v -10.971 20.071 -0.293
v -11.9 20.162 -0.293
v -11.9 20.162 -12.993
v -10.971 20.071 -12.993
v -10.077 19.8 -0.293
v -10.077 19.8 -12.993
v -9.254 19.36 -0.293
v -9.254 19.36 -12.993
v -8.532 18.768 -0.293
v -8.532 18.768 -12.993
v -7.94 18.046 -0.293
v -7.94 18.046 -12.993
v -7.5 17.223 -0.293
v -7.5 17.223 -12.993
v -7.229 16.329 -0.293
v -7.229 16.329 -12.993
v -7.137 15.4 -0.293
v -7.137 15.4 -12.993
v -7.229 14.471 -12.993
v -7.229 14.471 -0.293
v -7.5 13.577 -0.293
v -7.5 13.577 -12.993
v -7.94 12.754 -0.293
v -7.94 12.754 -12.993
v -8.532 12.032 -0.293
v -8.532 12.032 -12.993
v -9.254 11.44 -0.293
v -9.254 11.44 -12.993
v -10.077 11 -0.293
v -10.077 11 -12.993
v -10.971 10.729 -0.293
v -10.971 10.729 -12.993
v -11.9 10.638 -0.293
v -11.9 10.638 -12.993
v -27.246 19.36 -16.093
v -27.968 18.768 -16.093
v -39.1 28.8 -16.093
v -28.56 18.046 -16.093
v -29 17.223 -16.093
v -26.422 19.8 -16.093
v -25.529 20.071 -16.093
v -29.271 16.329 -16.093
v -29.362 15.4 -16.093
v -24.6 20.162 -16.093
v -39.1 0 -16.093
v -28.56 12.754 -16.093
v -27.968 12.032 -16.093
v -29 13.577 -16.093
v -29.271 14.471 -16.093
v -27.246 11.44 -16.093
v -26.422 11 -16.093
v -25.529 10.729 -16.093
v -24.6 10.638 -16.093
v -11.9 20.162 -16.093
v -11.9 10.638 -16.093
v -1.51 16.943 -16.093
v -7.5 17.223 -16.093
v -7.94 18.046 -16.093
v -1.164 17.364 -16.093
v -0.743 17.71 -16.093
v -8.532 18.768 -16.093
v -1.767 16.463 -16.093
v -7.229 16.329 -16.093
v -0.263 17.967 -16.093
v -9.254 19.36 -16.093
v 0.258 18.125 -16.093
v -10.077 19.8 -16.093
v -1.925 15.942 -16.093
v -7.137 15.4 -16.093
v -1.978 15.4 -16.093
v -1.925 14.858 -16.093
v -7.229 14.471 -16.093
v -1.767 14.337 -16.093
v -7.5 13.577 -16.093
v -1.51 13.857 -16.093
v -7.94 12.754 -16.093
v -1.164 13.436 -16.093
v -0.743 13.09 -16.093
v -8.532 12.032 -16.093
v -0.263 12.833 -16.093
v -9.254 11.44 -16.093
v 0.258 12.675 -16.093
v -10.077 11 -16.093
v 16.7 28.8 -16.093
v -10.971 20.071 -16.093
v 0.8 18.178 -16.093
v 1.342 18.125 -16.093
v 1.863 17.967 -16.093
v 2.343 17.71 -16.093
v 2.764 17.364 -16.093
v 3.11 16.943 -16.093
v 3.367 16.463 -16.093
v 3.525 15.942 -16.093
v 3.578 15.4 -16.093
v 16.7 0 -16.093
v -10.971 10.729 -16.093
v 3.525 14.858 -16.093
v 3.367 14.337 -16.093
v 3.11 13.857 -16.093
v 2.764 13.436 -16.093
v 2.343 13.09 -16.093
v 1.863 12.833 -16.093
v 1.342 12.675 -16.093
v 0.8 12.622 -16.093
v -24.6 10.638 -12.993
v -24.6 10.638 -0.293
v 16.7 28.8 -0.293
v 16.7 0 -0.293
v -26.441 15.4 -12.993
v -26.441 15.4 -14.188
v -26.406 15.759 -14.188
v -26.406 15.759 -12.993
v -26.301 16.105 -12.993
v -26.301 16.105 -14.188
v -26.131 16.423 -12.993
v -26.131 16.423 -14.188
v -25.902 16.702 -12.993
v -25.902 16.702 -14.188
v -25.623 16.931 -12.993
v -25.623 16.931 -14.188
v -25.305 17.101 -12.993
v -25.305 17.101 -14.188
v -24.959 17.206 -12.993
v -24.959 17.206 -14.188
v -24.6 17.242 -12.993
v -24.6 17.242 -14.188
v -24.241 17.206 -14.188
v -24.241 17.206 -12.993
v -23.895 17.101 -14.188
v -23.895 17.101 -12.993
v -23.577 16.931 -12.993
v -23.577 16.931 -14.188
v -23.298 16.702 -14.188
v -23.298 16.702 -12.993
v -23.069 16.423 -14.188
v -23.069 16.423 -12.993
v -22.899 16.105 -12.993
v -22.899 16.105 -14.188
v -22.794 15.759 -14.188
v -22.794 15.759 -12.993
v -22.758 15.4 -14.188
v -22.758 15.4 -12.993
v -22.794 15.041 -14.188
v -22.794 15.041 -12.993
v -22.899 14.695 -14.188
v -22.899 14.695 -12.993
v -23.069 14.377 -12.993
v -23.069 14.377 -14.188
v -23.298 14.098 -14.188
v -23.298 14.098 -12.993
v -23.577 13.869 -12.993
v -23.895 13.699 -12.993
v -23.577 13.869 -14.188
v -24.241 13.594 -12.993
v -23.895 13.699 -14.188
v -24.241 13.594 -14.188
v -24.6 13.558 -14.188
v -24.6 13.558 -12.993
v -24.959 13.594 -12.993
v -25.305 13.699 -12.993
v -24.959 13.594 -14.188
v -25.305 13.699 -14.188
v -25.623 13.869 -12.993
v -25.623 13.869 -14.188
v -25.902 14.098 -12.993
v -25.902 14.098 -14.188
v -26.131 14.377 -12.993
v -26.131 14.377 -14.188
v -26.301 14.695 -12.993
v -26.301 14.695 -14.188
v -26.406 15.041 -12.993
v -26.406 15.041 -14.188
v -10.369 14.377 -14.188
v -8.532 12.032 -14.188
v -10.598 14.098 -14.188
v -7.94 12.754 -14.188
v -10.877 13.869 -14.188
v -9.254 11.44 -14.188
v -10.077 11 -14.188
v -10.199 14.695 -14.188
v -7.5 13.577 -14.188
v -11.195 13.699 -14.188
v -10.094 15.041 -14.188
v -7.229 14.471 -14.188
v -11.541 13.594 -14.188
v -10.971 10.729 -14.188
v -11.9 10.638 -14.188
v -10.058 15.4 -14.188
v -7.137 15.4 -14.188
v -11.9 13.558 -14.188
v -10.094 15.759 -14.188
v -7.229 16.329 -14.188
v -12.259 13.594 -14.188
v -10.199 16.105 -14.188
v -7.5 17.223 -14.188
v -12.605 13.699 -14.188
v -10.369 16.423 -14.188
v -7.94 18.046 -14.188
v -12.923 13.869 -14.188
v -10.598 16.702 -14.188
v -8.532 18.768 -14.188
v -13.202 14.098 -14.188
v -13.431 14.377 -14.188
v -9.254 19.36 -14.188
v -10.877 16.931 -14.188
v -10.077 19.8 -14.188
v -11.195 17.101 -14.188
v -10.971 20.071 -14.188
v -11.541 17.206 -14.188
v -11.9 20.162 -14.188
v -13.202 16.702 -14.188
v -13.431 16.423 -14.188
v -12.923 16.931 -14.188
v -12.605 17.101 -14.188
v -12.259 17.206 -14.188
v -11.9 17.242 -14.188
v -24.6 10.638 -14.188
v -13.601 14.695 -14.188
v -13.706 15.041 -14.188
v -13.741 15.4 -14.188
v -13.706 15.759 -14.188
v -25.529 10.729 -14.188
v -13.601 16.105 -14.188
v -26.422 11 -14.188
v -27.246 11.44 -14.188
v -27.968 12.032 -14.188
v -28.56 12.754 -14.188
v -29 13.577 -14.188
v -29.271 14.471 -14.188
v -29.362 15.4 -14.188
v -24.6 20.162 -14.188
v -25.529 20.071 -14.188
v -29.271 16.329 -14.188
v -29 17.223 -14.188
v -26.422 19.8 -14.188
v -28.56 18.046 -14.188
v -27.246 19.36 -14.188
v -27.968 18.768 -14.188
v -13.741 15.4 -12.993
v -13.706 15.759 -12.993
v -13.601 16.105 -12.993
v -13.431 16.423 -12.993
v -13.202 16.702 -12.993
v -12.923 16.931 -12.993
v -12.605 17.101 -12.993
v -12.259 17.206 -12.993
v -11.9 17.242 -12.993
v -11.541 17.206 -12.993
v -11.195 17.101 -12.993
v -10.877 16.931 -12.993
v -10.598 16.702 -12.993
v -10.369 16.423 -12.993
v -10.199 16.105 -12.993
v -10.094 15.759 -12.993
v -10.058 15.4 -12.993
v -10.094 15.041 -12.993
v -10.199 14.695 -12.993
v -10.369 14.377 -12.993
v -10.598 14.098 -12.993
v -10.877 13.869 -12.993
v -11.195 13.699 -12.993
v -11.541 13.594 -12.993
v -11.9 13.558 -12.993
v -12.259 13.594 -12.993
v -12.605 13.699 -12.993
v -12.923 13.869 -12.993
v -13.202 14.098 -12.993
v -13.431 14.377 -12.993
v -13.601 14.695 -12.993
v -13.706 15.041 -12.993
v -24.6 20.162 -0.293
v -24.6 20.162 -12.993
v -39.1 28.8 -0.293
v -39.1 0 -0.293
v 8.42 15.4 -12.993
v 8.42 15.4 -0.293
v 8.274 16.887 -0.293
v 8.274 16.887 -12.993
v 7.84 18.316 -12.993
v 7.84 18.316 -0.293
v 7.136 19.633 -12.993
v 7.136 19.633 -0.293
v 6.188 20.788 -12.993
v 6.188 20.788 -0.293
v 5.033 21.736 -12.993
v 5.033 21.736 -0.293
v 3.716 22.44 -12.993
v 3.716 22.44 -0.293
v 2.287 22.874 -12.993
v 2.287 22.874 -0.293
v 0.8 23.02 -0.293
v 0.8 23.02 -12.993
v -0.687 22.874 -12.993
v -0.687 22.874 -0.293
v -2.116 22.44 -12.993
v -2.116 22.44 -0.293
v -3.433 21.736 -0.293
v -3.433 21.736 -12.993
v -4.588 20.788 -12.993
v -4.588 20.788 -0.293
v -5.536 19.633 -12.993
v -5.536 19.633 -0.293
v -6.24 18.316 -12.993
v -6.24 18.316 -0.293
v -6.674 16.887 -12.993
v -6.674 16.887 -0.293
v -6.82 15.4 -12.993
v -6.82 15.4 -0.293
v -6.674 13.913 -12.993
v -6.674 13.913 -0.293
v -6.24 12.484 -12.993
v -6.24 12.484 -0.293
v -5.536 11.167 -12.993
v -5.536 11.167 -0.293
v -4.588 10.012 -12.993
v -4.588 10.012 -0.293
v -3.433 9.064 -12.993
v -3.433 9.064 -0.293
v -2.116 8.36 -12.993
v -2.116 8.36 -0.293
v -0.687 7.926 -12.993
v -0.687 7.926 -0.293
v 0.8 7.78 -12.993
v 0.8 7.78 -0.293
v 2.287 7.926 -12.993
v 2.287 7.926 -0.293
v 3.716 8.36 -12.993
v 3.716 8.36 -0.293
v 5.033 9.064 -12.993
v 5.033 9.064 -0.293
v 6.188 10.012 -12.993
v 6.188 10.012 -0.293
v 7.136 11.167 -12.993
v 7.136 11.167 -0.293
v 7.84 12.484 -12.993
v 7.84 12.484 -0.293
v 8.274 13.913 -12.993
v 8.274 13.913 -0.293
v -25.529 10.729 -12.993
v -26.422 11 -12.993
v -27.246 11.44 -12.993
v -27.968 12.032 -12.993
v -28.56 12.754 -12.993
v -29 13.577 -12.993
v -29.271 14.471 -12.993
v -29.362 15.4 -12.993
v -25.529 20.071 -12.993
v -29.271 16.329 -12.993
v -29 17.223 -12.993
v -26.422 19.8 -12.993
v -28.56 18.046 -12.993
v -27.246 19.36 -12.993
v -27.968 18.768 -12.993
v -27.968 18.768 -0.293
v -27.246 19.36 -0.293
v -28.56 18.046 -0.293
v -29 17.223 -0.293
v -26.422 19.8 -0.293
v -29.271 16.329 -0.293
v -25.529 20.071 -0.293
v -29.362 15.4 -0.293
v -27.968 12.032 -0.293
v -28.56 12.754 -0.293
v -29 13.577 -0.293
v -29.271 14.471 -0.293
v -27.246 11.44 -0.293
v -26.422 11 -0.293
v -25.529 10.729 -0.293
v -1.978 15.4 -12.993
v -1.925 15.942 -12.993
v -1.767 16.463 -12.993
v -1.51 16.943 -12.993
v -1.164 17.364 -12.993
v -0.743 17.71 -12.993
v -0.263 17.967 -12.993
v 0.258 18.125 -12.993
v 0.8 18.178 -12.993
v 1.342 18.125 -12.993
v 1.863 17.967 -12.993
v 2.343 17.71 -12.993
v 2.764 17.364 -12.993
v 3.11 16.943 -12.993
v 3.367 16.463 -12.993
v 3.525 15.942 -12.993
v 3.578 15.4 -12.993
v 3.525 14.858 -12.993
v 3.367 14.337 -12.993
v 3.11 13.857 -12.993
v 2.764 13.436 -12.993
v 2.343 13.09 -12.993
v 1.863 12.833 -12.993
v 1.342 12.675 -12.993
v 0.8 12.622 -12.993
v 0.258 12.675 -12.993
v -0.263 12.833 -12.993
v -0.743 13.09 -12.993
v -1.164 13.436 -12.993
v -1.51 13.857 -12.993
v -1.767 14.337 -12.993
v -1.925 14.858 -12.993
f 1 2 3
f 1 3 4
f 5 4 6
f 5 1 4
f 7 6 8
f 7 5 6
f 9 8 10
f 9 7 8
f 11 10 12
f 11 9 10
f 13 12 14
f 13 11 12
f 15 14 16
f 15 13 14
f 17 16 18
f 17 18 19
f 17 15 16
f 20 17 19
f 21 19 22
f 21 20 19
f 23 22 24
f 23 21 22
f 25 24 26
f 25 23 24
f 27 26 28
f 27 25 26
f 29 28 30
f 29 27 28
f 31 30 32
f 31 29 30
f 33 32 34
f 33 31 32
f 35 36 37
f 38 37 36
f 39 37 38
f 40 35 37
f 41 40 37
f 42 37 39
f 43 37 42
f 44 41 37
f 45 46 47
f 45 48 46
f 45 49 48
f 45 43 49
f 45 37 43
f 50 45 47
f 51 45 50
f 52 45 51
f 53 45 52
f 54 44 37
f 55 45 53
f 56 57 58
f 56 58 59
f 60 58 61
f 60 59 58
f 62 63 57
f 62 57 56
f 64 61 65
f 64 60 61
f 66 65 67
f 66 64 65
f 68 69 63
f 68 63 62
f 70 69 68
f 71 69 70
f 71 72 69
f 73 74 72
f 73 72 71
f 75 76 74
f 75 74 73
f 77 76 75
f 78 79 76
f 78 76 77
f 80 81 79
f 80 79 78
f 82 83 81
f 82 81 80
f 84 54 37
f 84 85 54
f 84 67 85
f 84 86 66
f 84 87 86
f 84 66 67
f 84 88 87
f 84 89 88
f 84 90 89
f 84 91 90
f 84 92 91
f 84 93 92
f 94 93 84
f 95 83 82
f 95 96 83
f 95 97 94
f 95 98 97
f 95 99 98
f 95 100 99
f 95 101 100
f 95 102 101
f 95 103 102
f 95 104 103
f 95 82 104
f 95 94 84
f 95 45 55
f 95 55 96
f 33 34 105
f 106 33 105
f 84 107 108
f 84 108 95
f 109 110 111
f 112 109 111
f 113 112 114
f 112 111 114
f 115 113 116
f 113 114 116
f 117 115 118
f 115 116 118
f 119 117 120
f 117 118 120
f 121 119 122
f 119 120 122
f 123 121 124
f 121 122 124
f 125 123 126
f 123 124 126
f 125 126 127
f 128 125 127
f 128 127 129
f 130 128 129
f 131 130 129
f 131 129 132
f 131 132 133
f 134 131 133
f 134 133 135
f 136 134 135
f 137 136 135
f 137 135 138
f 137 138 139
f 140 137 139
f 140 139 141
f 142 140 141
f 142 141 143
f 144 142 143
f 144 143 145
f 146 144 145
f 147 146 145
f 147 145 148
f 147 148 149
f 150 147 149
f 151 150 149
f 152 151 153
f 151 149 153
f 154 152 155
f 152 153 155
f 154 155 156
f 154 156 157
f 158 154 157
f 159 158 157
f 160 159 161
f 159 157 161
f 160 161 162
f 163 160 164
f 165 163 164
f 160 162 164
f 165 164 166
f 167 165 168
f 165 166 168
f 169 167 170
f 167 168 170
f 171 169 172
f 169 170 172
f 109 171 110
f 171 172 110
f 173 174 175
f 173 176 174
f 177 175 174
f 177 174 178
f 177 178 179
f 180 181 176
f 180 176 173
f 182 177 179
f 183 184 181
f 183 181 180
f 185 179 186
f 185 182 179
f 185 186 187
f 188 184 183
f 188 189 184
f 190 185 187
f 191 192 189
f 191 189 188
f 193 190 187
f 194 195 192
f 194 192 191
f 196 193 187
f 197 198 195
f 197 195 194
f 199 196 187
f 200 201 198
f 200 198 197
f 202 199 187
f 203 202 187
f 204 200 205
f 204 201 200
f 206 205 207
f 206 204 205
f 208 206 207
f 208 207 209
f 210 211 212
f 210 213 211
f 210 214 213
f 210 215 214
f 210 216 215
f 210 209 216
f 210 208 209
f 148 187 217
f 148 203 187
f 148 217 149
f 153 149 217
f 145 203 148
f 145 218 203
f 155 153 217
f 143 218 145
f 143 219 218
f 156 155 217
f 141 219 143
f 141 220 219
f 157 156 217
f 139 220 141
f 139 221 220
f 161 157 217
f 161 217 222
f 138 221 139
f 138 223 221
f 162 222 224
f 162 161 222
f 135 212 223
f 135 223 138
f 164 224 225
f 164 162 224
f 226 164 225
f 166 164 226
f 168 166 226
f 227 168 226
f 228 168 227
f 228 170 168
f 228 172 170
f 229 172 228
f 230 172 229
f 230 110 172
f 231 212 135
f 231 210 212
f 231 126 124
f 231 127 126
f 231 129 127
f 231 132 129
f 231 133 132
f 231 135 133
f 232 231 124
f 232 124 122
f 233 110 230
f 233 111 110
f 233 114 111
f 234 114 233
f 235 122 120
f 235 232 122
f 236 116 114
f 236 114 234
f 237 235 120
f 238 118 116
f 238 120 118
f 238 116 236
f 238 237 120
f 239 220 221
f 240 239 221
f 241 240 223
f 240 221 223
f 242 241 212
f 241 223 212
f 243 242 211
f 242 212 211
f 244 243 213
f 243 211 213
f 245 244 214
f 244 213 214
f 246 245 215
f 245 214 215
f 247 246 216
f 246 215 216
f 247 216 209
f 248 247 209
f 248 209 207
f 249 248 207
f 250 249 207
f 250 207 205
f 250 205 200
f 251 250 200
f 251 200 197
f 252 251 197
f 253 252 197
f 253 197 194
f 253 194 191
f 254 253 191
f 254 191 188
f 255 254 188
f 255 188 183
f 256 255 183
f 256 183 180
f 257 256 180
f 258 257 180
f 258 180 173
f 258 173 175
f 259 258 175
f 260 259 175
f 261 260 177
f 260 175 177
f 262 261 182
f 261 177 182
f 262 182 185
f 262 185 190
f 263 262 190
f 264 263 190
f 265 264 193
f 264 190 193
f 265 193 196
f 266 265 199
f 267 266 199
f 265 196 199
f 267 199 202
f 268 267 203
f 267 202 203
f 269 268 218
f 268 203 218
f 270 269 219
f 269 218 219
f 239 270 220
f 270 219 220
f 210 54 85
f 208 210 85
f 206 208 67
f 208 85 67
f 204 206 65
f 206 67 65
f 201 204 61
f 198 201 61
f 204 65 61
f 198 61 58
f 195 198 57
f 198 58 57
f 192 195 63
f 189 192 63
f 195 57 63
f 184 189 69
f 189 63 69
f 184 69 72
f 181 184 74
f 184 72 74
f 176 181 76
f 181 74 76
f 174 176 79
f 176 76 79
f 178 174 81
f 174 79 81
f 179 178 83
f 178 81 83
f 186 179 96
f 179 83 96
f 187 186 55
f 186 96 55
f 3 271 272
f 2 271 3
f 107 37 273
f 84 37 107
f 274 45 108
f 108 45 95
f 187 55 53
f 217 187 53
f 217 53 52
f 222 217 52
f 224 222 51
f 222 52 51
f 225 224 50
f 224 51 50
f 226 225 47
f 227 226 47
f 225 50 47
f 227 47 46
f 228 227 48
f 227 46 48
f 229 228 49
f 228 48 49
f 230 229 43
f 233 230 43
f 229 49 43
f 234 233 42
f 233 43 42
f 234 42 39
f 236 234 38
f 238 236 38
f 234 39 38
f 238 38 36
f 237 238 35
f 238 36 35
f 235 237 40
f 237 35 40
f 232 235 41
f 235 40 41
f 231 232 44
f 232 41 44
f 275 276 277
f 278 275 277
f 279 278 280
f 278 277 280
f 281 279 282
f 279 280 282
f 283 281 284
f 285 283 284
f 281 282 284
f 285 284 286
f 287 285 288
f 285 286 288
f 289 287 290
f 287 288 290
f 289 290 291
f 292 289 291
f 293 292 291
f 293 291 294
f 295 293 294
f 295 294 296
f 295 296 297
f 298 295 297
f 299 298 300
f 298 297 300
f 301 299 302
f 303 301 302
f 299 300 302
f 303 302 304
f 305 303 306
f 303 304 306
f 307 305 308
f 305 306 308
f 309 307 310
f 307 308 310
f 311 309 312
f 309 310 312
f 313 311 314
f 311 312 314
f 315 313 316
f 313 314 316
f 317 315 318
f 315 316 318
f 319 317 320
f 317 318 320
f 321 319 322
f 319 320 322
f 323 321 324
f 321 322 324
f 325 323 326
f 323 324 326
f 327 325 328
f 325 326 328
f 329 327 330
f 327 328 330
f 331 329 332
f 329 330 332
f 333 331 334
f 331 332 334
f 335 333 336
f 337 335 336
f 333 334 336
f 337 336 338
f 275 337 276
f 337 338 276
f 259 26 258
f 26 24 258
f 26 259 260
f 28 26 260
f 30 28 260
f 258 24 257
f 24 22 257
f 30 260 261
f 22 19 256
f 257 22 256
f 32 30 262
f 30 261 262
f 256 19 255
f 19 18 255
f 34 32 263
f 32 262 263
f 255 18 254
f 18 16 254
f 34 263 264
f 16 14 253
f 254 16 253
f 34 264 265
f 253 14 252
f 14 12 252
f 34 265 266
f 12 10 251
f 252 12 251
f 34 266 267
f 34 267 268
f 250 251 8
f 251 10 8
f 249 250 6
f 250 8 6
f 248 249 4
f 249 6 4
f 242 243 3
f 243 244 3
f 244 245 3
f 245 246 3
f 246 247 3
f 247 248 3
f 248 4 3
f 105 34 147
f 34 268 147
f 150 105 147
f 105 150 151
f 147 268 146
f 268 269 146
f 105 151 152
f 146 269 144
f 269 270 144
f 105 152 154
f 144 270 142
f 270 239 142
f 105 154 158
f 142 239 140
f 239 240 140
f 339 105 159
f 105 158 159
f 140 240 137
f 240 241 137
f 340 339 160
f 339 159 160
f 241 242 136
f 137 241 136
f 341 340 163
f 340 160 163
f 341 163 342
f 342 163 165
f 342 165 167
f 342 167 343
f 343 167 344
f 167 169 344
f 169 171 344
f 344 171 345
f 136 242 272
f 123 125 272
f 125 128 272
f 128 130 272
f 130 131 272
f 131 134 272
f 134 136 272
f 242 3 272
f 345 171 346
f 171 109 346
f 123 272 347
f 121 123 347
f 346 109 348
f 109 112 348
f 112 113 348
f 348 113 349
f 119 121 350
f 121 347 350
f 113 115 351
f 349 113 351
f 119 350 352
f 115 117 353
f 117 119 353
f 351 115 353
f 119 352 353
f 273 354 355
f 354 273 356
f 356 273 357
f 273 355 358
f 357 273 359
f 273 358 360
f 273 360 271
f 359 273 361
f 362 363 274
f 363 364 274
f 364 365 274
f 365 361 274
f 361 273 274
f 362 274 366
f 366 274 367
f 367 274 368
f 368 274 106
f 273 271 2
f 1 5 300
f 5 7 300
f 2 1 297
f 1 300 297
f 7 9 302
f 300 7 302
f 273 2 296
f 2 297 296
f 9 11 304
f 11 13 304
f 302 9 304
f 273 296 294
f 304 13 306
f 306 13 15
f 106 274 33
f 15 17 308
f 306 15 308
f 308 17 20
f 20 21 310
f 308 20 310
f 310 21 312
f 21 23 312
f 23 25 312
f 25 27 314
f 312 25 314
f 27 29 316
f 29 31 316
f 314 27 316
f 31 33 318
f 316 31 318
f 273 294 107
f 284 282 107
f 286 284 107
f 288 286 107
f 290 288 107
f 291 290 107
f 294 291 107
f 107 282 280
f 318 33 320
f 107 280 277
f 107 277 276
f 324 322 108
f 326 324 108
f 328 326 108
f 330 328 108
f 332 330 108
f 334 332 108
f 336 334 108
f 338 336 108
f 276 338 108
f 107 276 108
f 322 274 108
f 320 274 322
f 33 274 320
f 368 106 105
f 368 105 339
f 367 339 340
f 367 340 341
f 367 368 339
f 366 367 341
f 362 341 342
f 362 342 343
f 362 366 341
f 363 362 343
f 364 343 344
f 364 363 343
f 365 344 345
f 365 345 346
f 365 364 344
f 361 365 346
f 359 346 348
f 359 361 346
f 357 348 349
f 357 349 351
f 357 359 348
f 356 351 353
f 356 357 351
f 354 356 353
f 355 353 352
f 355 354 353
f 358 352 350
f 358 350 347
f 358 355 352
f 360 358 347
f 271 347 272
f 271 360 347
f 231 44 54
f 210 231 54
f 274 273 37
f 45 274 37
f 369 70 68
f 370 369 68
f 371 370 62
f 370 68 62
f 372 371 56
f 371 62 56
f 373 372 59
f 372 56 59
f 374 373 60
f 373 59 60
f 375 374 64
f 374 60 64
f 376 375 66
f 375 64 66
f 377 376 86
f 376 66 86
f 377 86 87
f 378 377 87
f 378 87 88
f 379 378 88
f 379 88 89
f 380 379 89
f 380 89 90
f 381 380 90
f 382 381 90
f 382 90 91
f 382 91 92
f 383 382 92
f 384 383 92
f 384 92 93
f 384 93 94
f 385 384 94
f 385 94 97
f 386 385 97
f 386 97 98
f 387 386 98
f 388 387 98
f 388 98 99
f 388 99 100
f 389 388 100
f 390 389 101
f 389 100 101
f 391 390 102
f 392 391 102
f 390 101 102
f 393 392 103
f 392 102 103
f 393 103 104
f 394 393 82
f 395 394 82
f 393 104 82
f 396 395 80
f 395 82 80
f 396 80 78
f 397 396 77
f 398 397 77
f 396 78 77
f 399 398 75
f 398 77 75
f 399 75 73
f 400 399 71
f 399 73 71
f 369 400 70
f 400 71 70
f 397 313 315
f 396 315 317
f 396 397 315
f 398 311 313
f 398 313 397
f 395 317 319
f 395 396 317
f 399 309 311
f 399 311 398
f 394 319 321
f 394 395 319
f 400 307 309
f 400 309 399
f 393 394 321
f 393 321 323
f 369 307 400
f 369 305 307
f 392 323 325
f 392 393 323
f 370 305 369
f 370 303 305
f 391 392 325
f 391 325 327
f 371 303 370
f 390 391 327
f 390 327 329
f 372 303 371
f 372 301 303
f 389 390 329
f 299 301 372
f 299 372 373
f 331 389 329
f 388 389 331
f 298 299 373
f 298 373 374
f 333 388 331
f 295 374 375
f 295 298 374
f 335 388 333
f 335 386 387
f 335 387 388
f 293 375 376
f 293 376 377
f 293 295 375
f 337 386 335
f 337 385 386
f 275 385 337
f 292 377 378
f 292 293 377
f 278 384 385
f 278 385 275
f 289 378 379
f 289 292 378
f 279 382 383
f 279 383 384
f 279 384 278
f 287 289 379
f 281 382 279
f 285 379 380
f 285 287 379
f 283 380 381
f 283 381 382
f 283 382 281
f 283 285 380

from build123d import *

# Parameters (mm, degrees)
SKETCH1_W           = 55.8
SKETCH1_H           = 15.8
BOSS_EXTRUDE1_DEPTH = 28.8
SKETCH2_R           = 7.62
CUT_EXTRUDE1_DEPTH  = 12.7
SKETCH4_R           = 2.778125
SKETCH4_R_2         = 1.8415
CUT_EXTRUDE2_DEPTH  = 12.7
CUT_EXTRUDE6_DEPTH  = 1.905


with BuildPart() as part:
    # Sketch1 → Boss-Extrude1 (new body)
    with BuildSketch(Plane(origin=(0, 0, 0), x_dir=(1, 0, 0), z_dir=(0, 1, 0))):
        with Locations((-11.199948696, 8.193463303)):
            Rectangle(SKETCH1_W, SKETCH1_H)
    extrude(amount=BOSS_EXTRUDE1_DEPTH)

    # Sketch2 → Cut-Extrude1 (cut)
    with BuildSketch(Plane.XY.offset(-0.293463303)):
        with Locations((0.800051304, 15.4)):
            Circle(SKETCH2_R)
        with BuildLine():
            Line((-11.899948696, 10.6375), (-24.599948696, 10.6375))
            ThreePointArc((-24.599948696, 10.6375), (-29.362448696, 15.4), (-24.599948696, 20.1625))
            Line((-24.599948696, 20.1625), (-11.899948696, 20.1625))
            ThreePointArc((-11.899948696, 20.1625), (-7.137448696, 15.4), (-11.899948696, 10.6375))
        make_face()
    extrude(amount=-CUT_EXTRUDE1_DEPTH, mode=Mode.SUBTRACT)

    # Sketch4 → Cut-Extrude2 (cut)
    with BuildSketch(Plane(origin=(0, 0, -16.093463303), x_dir=(-1, 0, 0), z_dir=(0, 0, -1))):
        with Locations((-0.800051304, 15.4)):
            Circle(SKETCH4_R)
        with Locations((11.899948696, 15.4)):
            Circle(SKETCH4_R_2)
        with Locations((24.599948696, 15.4)):
            Circle(SKETCH4_R_2)
    extrude(amount=-CUT_EXTRUDE2_DEPTH, mode=Mode.SUBTRACT)

    # Sketch5 → Cut-Extrude6 (cut)
    with BuildSketch(Plane(origin=(0, 0, -16.093463303), x_dir=(-1, 0, 0), z_dir=(0, 0, -1))):
        with BuildLine():
            Line((24.599948696, 20.1625), (11.899948696, 20.1625))
            ThreePointArc((11.899948696, 20.1625), (7.137448696, 15.4), (11.899948696, 10.6375))
            Line((11.899948696, 10.6375), (24.599948696, 10.6375))
            ThreePointArc((24.599948696, 10.6375), (29.362448696, 15.4), (24.599948696, 20.1625))
        make_face()
    extrude(amount=-CUT_EXTRUDE6_DEPTH, mode=Mode.SUBTRACT)


solid = part.part
